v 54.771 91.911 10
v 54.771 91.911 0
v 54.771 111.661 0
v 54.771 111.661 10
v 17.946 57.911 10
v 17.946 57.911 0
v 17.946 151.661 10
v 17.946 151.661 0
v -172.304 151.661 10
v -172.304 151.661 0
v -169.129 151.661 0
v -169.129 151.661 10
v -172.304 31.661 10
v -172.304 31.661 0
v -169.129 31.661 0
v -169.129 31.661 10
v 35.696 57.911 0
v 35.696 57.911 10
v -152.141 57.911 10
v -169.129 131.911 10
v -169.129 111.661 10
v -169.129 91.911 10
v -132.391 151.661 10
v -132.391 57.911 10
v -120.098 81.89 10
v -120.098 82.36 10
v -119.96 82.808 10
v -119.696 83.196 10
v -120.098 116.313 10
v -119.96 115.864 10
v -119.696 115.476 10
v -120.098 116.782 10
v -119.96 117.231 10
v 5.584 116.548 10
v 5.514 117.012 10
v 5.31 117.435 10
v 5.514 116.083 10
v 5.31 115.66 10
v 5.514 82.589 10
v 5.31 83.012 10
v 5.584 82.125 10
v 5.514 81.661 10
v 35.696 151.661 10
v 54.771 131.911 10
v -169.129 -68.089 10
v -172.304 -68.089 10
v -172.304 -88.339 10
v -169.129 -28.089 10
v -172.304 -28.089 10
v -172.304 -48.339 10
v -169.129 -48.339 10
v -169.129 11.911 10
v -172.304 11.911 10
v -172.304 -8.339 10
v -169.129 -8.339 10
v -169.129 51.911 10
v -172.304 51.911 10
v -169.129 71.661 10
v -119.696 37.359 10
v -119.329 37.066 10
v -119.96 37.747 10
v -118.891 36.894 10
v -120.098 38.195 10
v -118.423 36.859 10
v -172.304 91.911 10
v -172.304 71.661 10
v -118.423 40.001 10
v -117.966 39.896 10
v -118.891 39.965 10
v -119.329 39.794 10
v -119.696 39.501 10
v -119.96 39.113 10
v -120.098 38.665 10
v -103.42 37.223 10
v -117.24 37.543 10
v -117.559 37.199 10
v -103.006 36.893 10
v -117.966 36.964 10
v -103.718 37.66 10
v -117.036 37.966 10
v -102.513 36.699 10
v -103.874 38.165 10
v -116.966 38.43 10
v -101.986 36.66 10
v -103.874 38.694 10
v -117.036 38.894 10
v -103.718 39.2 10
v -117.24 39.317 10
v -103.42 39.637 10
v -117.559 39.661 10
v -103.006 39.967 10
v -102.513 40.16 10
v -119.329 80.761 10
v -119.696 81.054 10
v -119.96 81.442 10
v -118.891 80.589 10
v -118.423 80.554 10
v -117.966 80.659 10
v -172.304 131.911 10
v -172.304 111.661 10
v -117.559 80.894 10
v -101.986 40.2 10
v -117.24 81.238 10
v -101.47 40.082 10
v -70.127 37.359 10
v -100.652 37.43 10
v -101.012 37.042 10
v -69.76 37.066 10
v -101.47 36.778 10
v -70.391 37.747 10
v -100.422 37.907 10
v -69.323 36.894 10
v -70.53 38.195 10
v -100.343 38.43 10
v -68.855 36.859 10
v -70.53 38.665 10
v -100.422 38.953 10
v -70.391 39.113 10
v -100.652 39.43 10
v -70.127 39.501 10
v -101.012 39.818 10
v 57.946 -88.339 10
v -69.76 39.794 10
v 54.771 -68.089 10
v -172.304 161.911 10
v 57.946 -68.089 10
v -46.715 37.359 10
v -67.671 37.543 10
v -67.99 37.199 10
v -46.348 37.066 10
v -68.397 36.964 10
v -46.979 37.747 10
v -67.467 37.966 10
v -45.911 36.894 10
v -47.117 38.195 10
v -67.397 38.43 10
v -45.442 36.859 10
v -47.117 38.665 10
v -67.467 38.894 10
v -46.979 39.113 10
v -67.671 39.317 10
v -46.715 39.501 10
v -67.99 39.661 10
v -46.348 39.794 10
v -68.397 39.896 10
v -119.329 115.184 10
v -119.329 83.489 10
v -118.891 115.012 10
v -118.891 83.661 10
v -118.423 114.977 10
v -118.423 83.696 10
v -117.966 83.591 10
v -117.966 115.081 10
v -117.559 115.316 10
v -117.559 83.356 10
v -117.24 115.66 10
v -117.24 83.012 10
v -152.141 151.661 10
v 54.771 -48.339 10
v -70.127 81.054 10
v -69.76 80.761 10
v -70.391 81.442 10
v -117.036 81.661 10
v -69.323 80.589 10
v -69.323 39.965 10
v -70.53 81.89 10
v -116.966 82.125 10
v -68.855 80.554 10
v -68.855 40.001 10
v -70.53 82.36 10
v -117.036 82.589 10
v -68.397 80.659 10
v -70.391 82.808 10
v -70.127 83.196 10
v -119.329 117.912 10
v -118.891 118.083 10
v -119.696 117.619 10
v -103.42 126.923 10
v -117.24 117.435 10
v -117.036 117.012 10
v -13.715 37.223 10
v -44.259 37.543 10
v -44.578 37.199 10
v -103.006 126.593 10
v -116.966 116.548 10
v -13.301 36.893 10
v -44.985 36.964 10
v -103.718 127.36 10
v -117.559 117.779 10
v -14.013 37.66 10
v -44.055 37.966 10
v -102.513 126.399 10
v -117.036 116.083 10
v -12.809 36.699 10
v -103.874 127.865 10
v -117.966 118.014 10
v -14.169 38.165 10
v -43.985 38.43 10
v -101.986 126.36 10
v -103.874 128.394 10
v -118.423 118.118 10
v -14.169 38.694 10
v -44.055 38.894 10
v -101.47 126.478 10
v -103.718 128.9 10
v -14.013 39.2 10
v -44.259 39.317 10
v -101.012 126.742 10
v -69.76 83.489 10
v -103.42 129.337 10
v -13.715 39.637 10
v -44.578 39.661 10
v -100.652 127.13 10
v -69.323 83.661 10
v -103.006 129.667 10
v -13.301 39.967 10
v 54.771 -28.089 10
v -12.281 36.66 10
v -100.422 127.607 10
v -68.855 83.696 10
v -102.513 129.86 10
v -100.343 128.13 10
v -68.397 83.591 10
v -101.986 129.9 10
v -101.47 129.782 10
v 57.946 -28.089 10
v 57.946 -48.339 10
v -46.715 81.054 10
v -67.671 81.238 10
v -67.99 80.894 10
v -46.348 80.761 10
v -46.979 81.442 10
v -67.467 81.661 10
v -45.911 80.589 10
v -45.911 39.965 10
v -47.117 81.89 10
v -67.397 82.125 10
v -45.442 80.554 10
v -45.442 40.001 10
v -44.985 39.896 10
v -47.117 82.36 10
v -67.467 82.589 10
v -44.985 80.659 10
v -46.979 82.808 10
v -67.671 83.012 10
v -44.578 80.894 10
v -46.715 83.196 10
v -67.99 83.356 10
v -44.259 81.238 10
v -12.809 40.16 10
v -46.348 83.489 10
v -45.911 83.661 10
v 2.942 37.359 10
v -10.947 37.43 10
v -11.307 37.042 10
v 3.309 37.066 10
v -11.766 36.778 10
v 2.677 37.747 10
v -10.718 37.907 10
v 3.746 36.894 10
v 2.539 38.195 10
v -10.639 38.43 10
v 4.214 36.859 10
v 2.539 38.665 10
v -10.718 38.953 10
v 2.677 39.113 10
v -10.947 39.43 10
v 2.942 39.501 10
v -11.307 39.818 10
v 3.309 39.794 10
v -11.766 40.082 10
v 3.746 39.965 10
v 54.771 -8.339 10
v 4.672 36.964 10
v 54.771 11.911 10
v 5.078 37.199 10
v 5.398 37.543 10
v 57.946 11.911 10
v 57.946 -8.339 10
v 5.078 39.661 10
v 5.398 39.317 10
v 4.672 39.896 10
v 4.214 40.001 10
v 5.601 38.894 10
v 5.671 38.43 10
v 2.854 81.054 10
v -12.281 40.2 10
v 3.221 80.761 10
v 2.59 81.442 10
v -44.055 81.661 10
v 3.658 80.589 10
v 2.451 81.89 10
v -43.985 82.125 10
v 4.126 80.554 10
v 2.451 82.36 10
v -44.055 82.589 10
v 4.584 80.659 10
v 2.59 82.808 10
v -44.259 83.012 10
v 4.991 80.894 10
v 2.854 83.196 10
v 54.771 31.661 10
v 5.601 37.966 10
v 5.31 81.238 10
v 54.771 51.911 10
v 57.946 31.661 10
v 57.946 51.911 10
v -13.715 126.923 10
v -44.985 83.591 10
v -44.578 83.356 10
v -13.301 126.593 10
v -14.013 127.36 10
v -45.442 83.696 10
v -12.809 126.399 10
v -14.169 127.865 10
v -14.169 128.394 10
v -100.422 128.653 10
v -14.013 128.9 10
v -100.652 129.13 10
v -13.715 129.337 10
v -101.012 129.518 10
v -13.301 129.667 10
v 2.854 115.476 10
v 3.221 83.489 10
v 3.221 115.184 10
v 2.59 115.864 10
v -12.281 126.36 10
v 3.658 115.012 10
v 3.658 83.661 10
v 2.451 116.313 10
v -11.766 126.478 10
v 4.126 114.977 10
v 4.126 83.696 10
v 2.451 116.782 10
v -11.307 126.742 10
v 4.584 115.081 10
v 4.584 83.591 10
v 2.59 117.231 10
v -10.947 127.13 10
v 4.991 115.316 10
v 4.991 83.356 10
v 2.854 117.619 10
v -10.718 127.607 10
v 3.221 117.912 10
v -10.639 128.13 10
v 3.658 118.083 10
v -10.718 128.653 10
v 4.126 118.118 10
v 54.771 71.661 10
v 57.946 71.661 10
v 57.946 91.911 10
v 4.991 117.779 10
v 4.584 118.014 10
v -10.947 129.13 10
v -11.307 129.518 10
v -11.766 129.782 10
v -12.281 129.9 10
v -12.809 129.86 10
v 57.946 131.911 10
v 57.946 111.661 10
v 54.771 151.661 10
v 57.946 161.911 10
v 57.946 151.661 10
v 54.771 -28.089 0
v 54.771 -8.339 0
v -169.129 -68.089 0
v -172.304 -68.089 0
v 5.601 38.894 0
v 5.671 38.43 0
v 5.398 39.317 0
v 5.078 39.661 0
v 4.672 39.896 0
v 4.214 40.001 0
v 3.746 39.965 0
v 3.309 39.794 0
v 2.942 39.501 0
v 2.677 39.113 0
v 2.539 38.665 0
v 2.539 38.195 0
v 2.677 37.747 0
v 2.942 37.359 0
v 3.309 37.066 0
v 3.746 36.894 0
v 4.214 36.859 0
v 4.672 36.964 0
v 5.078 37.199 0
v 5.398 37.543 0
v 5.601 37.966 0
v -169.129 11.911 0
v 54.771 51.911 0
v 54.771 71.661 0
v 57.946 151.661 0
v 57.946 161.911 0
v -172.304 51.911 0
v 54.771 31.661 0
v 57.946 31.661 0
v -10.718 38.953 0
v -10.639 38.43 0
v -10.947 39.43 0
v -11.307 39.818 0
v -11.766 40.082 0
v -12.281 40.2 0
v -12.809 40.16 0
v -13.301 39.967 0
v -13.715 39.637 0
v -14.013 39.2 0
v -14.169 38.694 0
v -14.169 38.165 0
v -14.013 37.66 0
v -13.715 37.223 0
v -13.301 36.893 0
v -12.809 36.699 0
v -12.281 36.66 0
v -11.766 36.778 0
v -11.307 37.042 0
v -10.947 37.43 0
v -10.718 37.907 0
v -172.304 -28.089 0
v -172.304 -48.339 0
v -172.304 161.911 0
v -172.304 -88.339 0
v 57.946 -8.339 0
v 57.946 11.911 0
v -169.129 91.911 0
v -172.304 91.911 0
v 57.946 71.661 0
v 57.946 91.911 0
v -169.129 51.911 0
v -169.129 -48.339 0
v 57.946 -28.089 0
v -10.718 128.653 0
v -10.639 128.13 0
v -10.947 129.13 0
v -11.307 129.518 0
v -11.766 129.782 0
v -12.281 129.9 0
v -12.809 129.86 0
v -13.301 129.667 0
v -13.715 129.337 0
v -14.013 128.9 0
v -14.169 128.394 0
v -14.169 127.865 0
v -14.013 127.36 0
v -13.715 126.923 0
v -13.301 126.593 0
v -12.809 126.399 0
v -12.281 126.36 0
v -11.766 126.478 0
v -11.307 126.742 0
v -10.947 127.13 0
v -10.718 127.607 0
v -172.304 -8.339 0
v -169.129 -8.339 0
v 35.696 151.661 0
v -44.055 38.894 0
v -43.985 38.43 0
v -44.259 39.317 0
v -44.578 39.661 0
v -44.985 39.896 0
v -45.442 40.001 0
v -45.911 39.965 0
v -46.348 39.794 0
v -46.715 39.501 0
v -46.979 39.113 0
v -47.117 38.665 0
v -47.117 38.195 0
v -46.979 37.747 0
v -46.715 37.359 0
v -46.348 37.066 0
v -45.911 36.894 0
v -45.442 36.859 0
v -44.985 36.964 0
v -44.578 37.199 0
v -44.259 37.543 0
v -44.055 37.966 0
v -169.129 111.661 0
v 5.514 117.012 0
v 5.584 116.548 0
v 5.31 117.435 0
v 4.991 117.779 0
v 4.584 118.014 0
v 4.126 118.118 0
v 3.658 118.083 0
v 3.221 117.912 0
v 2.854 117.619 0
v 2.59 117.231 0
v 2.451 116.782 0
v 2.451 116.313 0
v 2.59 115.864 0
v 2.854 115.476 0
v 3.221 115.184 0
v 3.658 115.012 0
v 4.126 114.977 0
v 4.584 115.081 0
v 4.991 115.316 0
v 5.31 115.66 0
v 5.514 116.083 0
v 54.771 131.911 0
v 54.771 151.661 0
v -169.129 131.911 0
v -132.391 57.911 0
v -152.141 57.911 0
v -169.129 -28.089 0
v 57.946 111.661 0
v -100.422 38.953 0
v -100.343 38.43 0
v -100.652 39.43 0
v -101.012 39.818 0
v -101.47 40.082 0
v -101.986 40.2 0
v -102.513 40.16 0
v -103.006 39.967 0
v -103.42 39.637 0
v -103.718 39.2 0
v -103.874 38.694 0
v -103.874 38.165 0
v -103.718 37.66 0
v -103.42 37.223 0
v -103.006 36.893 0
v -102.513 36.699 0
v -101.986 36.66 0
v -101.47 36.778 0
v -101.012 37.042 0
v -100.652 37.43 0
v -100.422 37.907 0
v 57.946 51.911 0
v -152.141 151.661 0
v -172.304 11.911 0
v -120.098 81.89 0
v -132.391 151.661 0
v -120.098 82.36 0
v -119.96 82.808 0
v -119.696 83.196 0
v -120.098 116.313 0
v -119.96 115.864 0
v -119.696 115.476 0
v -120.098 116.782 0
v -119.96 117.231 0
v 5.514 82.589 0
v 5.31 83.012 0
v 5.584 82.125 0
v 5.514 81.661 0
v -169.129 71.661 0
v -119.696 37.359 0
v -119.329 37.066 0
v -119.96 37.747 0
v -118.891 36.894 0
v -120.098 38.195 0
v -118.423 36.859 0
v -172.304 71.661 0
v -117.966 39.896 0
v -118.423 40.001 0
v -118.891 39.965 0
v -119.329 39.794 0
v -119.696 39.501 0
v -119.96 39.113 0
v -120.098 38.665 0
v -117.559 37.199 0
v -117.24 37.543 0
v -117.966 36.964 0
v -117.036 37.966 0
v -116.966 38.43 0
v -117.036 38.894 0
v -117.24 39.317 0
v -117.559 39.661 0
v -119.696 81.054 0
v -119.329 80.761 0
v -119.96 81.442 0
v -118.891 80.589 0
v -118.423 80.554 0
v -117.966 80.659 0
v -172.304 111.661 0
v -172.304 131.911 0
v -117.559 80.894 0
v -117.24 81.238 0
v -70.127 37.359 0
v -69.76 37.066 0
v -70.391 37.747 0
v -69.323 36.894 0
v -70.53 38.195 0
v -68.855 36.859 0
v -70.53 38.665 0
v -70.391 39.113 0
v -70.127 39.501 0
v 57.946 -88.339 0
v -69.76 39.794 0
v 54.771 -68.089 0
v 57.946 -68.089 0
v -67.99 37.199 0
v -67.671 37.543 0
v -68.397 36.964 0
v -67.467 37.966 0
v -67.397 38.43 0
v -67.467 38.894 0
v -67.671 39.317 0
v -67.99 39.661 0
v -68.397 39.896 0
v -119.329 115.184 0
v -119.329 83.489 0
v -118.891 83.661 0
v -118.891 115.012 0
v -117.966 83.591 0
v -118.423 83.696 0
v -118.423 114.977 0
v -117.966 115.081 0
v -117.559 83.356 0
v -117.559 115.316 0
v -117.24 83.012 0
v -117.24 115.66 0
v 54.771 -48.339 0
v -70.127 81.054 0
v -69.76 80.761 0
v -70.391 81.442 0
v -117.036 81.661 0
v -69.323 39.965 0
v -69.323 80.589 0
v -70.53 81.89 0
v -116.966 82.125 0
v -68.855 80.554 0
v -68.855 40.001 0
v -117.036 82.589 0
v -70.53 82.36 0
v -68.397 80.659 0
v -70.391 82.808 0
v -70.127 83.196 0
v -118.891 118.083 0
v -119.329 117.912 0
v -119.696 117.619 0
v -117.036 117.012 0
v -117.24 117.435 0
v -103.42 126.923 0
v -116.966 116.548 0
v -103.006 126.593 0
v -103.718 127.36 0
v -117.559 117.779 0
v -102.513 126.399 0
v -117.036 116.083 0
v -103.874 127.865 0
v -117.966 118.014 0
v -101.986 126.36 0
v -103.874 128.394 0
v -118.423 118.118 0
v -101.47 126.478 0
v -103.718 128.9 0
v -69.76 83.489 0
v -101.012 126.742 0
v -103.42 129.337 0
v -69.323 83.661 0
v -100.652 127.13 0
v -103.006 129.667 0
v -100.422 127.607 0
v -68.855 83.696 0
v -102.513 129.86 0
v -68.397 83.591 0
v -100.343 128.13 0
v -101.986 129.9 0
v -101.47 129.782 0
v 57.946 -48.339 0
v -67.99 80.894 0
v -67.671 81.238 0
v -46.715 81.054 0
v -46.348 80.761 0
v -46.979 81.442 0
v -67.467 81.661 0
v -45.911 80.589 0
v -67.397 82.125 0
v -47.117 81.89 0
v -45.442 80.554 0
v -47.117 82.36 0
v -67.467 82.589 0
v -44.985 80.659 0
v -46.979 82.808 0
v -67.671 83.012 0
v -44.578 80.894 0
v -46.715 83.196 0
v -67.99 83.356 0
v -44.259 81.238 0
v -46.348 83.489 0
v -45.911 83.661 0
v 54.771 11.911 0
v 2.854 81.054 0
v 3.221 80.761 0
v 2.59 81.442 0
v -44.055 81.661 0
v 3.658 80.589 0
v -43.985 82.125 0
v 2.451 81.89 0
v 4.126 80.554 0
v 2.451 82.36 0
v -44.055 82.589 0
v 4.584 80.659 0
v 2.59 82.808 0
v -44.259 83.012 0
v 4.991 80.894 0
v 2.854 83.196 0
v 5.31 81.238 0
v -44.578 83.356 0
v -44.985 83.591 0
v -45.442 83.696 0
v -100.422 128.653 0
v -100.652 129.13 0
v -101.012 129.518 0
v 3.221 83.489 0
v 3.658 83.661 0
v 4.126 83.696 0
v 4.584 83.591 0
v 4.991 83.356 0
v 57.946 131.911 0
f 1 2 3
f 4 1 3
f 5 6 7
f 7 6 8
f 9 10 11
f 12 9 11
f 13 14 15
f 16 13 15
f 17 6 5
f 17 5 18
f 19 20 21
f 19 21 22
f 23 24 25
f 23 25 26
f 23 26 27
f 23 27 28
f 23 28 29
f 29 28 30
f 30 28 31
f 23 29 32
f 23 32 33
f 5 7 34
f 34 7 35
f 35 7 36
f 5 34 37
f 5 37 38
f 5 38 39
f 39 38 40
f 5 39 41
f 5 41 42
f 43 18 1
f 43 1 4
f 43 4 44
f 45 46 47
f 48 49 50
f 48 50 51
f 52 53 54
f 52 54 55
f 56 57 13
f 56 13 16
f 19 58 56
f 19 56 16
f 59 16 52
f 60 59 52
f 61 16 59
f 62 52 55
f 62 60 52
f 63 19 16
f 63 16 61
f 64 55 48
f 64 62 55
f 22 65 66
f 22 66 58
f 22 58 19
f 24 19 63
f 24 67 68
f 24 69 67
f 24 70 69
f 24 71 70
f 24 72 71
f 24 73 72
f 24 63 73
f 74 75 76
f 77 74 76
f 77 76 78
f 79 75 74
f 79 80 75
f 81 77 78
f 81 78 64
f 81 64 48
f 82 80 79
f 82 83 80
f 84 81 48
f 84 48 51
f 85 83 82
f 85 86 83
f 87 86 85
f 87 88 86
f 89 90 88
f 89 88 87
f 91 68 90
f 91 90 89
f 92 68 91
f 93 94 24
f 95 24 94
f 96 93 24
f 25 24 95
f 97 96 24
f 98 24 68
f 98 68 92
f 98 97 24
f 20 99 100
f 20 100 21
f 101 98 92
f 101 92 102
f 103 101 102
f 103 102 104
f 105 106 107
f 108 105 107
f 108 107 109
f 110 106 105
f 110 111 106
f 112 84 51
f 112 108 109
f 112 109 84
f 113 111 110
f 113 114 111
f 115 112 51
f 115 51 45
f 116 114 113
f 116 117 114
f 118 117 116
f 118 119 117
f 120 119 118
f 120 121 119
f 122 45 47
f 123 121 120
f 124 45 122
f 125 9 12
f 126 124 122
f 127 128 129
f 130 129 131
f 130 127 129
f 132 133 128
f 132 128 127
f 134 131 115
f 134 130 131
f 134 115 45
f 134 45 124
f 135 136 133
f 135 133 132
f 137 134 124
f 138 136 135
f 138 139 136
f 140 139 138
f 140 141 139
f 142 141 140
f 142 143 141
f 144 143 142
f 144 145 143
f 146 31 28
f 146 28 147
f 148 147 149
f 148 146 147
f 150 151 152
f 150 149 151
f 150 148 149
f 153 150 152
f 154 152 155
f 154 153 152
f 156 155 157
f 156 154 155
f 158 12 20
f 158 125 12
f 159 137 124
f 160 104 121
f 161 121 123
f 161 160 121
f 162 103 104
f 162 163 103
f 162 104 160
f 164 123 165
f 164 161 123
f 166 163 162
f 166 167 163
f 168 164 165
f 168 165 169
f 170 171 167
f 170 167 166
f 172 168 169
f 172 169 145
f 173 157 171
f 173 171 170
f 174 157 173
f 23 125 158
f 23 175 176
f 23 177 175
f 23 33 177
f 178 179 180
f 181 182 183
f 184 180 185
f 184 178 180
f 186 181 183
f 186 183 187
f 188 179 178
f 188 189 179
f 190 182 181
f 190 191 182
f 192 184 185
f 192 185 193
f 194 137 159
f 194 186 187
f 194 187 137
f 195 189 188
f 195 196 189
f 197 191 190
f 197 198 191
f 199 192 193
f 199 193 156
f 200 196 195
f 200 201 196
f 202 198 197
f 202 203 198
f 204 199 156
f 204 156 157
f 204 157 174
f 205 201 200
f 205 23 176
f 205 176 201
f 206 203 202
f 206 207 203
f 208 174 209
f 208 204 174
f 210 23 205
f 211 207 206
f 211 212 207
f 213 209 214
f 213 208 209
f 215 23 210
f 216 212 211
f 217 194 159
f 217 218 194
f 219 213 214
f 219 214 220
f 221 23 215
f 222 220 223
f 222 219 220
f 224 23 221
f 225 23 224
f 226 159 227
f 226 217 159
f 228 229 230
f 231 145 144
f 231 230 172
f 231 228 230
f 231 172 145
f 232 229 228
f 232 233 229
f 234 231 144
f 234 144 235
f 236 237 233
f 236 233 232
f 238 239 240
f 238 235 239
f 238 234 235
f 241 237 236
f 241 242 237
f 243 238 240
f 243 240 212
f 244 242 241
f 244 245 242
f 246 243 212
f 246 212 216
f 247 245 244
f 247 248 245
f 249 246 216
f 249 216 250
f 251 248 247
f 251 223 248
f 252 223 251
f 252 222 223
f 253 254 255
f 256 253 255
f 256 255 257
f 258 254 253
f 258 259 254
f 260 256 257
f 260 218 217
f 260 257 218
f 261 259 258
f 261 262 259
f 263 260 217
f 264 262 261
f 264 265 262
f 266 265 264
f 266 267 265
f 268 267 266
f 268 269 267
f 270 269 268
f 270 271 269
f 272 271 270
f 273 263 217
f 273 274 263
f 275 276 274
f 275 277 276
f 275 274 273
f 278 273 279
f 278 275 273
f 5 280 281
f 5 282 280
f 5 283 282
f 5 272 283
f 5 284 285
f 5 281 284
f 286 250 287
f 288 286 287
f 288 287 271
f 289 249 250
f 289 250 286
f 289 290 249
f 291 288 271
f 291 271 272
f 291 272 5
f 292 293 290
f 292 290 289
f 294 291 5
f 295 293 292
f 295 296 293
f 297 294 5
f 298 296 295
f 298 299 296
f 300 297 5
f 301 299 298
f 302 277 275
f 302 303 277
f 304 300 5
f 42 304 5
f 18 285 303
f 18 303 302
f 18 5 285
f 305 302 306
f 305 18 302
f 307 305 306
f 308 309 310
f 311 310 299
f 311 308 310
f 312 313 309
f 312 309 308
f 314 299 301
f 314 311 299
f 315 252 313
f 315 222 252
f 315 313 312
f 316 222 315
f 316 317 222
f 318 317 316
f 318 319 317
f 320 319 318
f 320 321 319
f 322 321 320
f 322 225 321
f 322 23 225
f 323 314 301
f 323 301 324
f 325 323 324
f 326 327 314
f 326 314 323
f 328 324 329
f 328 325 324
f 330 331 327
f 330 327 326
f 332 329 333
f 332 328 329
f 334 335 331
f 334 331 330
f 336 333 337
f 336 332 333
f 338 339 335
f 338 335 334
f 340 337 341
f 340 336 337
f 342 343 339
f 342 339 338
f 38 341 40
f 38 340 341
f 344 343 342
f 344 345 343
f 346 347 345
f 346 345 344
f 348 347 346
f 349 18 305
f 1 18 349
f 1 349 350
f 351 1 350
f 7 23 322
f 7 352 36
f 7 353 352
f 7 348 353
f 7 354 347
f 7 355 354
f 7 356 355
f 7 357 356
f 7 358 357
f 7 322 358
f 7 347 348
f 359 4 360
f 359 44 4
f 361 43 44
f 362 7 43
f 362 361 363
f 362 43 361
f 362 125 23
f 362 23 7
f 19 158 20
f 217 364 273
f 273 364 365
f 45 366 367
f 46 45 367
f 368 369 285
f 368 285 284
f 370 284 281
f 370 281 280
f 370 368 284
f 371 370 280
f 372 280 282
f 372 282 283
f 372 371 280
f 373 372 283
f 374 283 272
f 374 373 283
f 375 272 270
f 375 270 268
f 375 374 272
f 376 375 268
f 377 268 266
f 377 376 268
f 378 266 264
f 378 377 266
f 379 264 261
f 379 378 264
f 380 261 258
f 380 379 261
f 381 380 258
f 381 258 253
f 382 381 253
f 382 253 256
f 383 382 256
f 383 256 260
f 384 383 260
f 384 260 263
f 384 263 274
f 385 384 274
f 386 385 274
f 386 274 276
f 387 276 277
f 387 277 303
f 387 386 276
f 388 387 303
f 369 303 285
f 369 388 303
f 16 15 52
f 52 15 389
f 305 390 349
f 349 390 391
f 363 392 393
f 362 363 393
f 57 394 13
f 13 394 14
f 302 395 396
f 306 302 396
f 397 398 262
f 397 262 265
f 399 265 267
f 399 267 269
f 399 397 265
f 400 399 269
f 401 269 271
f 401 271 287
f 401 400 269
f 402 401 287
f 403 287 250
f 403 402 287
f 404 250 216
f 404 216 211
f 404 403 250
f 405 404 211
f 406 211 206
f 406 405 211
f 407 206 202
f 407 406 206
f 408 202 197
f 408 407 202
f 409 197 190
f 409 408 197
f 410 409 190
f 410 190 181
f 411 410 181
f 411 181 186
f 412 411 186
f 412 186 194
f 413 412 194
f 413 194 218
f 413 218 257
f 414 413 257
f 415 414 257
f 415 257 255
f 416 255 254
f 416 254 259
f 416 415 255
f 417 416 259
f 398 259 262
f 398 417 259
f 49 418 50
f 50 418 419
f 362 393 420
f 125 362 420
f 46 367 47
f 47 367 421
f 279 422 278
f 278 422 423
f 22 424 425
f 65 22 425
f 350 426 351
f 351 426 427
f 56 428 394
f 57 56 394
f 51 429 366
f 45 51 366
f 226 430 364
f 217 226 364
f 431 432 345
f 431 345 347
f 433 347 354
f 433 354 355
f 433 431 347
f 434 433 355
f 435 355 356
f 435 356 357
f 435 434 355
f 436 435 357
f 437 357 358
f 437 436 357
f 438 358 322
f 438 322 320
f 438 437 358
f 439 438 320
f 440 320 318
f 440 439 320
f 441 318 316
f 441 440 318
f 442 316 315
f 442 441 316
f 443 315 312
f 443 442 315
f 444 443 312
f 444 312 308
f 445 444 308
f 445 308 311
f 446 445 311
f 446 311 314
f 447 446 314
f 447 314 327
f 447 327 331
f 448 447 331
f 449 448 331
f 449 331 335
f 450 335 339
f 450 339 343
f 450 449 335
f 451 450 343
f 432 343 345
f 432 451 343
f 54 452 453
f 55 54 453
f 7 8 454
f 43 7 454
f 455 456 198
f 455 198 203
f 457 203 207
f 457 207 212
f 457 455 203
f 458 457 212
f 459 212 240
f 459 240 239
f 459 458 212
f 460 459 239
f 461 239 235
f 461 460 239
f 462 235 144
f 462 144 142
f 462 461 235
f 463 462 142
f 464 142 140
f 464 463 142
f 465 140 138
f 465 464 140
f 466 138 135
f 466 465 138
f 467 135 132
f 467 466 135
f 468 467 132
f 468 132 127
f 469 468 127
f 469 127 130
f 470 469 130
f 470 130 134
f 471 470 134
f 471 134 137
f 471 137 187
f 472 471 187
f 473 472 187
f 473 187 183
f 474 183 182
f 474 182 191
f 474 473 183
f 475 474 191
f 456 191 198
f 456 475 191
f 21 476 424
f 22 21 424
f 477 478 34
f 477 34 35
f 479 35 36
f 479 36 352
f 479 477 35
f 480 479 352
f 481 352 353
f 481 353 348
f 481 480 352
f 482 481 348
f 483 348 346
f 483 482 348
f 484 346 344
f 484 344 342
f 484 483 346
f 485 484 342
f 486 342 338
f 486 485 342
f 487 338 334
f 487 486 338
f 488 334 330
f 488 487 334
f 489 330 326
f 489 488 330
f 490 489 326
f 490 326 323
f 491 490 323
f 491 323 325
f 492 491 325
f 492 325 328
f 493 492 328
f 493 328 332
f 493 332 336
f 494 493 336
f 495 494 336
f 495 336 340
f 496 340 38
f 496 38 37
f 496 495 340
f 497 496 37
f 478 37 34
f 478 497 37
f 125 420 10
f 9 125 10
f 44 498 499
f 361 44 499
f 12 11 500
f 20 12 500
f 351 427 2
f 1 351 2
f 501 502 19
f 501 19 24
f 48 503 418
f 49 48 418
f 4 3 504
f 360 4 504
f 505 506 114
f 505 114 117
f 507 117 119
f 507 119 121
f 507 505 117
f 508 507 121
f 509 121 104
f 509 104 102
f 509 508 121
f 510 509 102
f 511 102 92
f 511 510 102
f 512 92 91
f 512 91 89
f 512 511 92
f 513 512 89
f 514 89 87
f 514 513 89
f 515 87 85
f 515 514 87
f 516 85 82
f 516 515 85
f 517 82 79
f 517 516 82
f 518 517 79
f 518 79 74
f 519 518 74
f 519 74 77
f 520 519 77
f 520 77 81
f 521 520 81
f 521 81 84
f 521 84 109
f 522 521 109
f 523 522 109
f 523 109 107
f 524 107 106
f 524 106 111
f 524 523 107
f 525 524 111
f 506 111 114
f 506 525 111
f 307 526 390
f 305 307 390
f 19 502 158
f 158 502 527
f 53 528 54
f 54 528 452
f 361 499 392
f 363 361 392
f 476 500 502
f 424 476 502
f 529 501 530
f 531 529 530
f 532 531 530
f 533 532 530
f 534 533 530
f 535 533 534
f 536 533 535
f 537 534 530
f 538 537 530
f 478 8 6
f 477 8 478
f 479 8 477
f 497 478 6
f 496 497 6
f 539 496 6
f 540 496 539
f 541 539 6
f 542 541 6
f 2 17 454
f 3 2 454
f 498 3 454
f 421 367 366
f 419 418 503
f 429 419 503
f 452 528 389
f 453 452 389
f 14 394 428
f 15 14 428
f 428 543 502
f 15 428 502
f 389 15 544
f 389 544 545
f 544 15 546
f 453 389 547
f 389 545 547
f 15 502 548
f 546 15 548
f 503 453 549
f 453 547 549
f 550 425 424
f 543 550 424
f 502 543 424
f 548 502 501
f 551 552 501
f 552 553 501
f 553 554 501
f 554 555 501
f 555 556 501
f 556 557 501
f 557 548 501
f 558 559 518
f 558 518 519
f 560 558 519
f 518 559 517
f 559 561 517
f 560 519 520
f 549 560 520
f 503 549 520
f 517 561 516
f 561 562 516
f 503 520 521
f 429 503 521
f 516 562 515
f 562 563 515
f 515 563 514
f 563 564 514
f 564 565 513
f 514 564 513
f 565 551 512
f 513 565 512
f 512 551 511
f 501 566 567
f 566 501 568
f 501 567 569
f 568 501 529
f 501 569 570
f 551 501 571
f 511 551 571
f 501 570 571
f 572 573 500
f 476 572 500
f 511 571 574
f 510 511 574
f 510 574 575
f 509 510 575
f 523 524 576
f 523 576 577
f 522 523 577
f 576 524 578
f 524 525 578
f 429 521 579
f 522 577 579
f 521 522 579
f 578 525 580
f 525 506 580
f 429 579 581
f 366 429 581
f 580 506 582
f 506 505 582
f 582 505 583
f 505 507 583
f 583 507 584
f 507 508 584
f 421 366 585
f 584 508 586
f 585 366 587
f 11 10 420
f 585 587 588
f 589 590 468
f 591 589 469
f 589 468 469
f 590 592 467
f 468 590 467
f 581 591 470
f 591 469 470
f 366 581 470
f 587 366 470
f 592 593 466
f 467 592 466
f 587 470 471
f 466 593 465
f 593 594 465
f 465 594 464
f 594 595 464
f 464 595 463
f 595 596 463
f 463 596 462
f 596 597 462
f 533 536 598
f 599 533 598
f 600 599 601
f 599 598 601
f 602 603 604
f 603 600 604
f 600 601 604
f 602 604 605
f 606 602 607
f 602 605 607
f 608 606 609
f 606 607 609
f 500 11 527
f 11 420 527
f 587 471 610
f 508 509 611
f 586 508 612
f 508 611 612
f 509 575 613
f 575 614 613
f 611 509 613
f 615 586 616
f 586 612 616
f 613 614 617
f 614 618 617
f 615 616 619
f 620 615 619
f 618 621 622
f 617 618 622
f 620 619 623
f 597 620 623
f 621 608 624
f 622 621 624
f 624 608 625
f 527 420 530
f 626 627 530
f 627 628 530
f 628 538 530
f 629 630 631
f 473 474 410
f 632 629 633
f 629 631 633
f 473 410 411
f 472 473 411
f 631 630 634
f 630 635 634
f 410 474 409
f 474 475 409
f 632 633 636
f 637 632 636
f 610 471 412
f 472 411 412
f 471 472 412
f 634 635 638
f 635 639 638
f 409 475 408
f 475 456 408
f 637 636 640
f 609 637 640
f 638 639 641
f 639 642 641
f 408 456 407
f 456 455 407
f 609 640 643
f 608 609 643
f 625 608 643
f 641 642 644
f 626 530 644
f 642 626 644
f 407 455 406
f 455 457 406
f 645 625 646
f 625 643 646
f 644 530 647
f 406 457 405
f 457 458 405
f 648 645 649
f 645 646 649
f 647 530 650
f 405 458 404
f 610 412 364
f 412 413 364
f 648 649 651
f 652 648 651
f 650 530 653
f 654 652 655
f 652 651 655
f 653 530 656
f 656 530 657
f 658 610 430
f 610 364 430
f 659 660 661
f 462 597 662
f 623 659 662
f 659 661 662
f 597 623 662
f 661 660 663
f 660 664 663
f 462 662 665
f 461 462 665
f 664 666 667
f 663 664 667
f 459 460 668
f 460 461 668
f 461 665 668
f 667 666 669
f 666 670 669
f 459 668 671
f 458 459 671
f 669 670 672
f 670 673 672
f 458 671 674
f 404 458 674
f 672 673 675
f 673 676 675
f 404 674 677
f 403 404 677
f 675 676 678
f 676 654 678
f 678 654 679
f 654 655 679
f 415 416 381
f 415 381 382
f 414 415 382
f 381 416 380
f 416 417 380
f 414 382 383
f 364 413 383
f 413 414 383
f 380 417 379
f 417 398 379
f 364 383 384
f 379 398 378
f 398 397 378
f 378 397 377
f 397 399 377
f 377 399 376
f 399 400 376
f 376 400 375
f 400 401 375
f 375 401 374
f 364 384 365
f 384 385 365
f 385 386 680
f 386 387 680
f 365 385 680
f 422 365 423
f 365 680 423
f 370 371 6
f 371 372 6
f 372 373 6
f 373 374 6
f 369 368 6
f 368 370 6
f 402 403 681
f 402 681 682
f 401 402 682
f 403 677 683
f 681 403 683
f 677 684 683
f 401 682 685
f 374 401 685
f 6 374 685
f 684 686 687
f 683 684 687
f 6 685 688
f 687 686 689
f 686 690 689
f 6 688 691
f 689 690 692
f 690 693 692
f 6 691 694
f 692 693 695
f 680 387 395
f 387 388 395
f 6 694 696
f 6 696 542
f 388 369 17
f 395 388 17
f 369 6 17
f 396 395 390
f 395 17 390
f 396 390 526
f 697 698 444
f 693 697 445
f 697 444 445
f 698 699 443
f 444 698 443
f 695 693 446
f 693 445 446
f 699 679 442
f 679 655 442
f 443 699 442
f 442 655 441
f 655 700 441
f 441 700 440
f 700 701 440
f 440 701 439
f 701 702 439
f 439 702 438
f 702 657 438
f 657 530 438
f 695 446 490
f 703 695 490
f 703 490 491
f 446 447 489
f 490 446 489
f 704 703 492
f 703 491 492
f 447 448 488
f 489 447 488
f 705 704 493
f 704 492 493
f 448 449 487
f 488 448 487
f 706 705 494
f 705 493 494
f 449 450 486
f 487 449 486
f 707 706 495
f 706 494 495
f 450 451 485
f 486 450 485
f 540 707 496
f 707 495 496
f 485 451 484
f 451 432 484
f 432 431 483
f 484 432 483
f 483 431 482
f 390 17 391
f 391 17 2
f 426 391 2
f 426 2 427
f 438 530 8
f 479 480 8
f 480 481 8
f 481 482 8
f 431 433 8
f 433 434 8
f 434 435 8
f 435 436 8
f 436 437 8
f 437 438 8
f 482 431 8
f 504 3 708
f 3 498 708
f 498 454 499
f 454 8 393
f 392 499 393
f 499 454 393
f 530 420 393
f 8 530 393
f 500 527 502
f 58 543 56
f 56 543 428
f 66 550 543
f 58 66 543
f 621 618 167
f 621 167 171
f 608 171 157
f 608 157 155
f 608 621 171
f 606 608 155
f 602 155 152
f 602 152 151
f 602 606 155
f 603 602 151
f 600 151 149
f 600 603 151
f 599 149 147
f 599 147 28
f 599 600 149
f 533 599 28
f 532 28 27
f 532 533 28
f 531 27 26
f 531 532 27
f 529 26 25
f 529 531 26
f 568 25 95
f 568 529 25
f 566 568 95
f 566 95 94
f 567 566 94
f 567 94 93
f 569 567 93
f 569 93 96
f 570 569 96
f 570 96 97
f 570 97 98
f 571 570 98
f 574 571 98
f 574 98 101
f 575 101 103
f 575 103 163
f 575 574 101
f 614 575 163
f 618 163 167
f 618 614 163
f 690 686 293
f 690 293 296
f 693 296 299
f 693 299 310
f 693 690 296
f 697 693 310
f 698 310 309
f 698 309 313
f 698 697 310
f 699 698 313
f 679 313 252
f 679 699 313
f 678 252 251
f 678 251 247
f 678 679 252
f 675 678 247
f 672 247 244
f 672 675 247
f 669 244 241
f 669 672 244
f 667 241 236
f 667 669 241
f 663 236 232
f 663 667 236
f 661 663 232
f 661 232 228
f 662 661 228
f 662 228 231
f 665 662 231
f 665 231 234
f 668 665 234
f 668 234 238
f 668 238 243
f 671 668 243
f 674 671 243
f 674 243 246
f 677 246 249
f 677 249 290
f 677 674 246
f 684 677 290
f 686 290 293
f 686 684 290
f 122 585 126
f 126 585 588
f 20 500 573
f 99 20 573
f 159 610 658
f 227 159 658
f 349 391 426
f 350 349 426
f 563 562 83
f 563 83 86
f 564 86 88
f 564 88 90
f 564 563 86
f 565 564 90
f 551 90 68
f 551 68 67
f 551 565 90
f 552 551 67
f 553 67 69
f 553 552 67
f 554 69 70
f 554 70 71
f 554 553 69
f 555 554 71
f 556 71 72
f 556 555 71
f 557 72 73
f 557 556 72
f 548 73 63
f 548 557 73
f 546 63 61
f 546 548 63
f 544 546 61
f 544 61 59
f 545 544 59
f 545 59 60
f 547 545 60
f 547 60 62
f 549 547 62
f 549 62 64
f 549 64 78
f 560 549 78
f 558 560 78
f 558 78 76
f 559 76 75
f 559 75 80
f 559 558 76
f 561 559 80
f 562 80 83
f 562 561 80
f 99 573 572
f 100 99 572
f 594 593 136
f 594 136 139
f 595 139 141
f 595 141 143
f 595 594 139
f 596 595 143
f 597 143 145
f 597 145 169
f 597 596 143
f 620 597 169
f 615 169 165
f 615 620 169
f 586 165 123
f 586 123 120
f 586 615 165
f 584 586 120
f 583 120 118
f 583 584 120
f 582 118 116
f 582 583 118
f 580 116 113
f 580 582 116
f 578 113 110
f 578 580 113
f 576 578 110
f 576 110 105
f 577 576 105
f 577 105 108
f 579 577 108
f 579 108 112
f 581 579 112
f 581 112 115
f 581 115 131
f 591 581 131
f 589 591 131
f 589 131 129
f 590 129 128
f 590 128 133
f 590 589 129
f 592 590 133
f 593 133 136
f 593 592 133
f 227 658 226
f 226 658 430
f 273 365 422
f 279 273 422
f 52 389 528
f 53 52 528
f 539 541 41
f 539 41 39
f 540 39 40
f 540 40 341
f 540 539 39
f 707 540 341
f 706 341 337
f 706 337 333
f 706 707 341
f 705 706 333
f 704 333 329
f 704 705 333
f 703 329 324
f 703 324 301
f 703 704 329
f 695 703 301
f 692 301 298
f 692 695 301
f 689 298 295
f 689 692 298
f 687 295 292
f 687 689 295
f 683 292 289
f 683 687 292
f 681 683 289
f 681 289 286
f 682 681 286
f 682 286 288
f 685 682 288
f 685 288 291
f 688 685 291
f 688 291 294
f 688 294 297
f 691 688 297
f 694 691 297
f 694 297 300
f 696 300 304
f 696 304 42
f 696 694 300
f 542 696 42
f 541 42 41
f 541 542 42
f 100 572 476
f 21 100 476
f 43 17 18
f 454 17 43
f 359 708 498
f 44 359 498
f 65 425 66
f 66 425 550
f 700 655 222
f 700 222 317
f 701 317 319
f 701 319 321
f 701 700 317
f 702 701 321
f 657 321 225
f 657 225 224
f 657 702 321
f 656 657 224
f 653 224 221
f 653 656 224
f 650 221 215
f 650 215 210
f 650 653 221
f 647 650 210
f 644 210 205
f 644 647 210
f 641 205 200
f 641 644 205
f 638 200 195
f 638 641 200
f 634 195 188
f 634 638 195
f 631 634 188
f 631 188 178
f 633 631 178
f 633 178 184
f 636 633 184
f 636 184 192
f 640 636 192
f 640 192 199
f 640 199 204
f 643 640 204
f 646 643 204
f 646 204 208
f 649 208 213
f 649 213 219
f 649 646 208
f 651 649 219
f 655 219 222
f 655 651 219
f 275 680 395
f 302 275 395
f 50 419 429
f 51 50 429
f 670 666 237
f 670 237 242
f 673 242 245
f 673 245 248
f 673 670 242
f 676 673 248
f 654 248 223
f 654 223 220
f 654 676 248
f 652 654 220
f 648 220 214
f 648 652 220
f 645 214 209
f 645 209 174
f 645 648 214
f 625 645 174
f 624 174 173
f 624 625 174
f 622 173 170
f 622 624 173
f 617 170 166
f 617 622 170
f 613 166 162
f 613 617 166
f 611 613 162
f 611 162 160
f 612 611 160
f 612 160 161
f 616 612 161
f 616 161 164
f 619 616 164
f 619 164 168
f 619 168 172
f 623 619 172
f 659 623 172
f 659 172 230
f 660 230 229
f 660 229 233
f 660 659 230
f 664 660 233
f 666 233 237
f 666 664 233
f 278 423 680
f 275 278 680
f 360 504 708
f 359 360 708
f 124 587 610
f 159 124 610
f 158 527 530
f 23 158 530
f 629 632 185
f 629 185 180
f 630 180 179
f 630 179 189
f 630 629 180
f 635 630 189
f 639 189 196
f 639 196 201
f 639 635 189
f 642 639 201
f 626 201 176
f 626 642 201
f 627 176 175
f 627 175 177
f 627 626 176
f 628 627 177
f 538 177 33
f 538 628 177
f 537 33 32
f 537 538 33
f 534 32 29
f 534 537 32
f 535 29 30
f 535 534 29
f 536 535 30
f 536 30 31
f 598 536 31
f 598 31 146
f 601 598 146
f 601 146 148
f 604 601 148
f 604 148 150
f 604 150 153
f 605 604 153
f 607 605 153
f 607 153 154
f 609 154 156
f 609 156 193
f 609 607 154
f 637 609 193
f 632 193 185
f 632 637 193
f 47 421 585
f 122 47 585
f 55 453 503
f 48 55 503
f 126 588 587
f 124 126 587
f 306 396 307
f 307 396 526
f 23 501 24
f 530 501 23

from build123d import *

# Parameters (mm, degrees)
MODEL_R             = 1.775
MODEL_R_2           = 1.575
MODEL_W             = 19.75
MODEL_H             = 93.75
MODEL_W_2           = 17.75
BOSS_EXTRUDE1_DEPTH = 10


with BuildPart() as part:
    # Model → Boss-Extrude1 (new body)
    with BuildSketch(Plane.XY):
        Polygon((57.946480534, -88.339102909), (57.946480534, -68.089102909), (54.771480534, -68.089102909), (54.771480534, -48.339102909), (57.946480534, -48.339102909), (57.946480534, -28.089102909), (54.771480534, -28.089102909), (54.771480534, -8.339102909), (57.946480534, -8.339102909), (57.946480534, 11.910897091), (54.771480534, 11.910897091), (54.771480534, 31.660897091), (57.946480534, 31.660897091), (57.946480534, 51.910897091), (54.771480534, 51.910897091), (54.771480534, 71.660897091), (57.946480534, 71.660897091), (57.946480534, 91.910897091), (54.771480534, 91.910897091), (54.771480534, 111.660897091), (57.946480534, 111.660897091), (57.946480534, 131.910897091), (54.771480534, 131.910897091), (54.771480534, 151.660897091), (57.946480534, 151.660897091), (57.946480534, 161.910897091), (-172.303519466, 161.910897091), (-172.303519466, 151.660897091), (-169.128519466, 151.660897091), (-169.128519466, 131.910897091), (-172.303519466, 131.910897091), (-172.303519466, 111.660897091), (-169.128519466, 111.660897091), (-169.128519466, 91.910897091), (-172.303519466, 91.910897091), (-172.303519466, 71.660897091), (-169.128519466, 71.660897091), (-169.128519466, 51.910897091), (-172.303519466, 51.910897091), (-172.303519466, 31.660897091), (-169.128519466, 31.660897091), (-169.128519466, 11.910897091), (-172.303519466, 11.910897091), (-172.303519466, -8.339102909), (-169.128519466, -8.339102909), (-169.128519466, -28.089102909), (-172.303519466, -28.089102909), (-172.303519466, -48.339102909), (-169.128519466, -48.339102909), (-169.128519466, -68.089102909), (-172.303519466, -68.089102909), (-172.303519466, -88.339102909), align=None)
        with Locations((-12.413986694, 38.429929163)):
            Circle(MODEL_R, mode=Mode.SUBTRACT)
        with Locations((4.096306466, 38.429929163)):
            Circle(MODEL_R_2, mode=Mode.SUBTRACT)
        with Locations((4.008638821, 82.124992621)):
            Circle(MODEL_R_2, mode=Mode.SUBTRACT)
        with Locations((-45.560089874, 82.12499262)):
            Circle(MODEL_R_2, mode=Mode.SUBTRACT)
        with Locations((-45.560089874, 38.429929163)):
            Circle(MODEL_R_2, mode=Mode.SUBTRACT)
        with Locations((-68.972284348, 38.429929163)):
            Circle(MODEL_R_2, mode=Mode.SUBTRACT)
        with Locations((-68.972284348, 82.12499262)):
            Circle(MODEL_R_2, mode=Mode.SUBTRACT)
        with Locations((-102.118387528, 38.429929163)):
            Circle(MODEL_R, mode=Mode.SUBTRACT)
        with Locations((-118.541013043, 38.429929163)):
            Circle(MODEL_R_2, mode=Mode.SUBTRACT)
        with Locations((-118.541013043, 82.12499262)):
            Circle(MODEL_R_2, mode=Mode.SUBTRACT)
        with Locations((-118.541013043, 116.547553094)):
            Circle(MODEL_R_2, mode=Mode.SUBTRACT)
        with Locations((-102.118387528, 128.129929163)):
            Circle(MODEL_R, mode=Mode.SUBTRACT)
        with Locations((-12.413986694, 128.129929163)):
            Circle(MODEL_R, mode=Mode.SUBTRACT)
        with Locations((4.008638821, 116.547553094)):
            Circle(MODEL_R_2, mode=Mode.SUBTRACT)
        with Locations((-142.266187111, 104.785897091)):
            Rectangle(MODEL_W, MODEL_H, mode=Mode.SUBTRACT)
        with Locations((26.821480534, 104.785897091)):
            Rectangle(MODEL_W_2, MODEL_H, mode=Mode.SUBTRACT)
    extrude(amount=BOSS_EXTRUDE1_DEPTH)


solid = part.part
